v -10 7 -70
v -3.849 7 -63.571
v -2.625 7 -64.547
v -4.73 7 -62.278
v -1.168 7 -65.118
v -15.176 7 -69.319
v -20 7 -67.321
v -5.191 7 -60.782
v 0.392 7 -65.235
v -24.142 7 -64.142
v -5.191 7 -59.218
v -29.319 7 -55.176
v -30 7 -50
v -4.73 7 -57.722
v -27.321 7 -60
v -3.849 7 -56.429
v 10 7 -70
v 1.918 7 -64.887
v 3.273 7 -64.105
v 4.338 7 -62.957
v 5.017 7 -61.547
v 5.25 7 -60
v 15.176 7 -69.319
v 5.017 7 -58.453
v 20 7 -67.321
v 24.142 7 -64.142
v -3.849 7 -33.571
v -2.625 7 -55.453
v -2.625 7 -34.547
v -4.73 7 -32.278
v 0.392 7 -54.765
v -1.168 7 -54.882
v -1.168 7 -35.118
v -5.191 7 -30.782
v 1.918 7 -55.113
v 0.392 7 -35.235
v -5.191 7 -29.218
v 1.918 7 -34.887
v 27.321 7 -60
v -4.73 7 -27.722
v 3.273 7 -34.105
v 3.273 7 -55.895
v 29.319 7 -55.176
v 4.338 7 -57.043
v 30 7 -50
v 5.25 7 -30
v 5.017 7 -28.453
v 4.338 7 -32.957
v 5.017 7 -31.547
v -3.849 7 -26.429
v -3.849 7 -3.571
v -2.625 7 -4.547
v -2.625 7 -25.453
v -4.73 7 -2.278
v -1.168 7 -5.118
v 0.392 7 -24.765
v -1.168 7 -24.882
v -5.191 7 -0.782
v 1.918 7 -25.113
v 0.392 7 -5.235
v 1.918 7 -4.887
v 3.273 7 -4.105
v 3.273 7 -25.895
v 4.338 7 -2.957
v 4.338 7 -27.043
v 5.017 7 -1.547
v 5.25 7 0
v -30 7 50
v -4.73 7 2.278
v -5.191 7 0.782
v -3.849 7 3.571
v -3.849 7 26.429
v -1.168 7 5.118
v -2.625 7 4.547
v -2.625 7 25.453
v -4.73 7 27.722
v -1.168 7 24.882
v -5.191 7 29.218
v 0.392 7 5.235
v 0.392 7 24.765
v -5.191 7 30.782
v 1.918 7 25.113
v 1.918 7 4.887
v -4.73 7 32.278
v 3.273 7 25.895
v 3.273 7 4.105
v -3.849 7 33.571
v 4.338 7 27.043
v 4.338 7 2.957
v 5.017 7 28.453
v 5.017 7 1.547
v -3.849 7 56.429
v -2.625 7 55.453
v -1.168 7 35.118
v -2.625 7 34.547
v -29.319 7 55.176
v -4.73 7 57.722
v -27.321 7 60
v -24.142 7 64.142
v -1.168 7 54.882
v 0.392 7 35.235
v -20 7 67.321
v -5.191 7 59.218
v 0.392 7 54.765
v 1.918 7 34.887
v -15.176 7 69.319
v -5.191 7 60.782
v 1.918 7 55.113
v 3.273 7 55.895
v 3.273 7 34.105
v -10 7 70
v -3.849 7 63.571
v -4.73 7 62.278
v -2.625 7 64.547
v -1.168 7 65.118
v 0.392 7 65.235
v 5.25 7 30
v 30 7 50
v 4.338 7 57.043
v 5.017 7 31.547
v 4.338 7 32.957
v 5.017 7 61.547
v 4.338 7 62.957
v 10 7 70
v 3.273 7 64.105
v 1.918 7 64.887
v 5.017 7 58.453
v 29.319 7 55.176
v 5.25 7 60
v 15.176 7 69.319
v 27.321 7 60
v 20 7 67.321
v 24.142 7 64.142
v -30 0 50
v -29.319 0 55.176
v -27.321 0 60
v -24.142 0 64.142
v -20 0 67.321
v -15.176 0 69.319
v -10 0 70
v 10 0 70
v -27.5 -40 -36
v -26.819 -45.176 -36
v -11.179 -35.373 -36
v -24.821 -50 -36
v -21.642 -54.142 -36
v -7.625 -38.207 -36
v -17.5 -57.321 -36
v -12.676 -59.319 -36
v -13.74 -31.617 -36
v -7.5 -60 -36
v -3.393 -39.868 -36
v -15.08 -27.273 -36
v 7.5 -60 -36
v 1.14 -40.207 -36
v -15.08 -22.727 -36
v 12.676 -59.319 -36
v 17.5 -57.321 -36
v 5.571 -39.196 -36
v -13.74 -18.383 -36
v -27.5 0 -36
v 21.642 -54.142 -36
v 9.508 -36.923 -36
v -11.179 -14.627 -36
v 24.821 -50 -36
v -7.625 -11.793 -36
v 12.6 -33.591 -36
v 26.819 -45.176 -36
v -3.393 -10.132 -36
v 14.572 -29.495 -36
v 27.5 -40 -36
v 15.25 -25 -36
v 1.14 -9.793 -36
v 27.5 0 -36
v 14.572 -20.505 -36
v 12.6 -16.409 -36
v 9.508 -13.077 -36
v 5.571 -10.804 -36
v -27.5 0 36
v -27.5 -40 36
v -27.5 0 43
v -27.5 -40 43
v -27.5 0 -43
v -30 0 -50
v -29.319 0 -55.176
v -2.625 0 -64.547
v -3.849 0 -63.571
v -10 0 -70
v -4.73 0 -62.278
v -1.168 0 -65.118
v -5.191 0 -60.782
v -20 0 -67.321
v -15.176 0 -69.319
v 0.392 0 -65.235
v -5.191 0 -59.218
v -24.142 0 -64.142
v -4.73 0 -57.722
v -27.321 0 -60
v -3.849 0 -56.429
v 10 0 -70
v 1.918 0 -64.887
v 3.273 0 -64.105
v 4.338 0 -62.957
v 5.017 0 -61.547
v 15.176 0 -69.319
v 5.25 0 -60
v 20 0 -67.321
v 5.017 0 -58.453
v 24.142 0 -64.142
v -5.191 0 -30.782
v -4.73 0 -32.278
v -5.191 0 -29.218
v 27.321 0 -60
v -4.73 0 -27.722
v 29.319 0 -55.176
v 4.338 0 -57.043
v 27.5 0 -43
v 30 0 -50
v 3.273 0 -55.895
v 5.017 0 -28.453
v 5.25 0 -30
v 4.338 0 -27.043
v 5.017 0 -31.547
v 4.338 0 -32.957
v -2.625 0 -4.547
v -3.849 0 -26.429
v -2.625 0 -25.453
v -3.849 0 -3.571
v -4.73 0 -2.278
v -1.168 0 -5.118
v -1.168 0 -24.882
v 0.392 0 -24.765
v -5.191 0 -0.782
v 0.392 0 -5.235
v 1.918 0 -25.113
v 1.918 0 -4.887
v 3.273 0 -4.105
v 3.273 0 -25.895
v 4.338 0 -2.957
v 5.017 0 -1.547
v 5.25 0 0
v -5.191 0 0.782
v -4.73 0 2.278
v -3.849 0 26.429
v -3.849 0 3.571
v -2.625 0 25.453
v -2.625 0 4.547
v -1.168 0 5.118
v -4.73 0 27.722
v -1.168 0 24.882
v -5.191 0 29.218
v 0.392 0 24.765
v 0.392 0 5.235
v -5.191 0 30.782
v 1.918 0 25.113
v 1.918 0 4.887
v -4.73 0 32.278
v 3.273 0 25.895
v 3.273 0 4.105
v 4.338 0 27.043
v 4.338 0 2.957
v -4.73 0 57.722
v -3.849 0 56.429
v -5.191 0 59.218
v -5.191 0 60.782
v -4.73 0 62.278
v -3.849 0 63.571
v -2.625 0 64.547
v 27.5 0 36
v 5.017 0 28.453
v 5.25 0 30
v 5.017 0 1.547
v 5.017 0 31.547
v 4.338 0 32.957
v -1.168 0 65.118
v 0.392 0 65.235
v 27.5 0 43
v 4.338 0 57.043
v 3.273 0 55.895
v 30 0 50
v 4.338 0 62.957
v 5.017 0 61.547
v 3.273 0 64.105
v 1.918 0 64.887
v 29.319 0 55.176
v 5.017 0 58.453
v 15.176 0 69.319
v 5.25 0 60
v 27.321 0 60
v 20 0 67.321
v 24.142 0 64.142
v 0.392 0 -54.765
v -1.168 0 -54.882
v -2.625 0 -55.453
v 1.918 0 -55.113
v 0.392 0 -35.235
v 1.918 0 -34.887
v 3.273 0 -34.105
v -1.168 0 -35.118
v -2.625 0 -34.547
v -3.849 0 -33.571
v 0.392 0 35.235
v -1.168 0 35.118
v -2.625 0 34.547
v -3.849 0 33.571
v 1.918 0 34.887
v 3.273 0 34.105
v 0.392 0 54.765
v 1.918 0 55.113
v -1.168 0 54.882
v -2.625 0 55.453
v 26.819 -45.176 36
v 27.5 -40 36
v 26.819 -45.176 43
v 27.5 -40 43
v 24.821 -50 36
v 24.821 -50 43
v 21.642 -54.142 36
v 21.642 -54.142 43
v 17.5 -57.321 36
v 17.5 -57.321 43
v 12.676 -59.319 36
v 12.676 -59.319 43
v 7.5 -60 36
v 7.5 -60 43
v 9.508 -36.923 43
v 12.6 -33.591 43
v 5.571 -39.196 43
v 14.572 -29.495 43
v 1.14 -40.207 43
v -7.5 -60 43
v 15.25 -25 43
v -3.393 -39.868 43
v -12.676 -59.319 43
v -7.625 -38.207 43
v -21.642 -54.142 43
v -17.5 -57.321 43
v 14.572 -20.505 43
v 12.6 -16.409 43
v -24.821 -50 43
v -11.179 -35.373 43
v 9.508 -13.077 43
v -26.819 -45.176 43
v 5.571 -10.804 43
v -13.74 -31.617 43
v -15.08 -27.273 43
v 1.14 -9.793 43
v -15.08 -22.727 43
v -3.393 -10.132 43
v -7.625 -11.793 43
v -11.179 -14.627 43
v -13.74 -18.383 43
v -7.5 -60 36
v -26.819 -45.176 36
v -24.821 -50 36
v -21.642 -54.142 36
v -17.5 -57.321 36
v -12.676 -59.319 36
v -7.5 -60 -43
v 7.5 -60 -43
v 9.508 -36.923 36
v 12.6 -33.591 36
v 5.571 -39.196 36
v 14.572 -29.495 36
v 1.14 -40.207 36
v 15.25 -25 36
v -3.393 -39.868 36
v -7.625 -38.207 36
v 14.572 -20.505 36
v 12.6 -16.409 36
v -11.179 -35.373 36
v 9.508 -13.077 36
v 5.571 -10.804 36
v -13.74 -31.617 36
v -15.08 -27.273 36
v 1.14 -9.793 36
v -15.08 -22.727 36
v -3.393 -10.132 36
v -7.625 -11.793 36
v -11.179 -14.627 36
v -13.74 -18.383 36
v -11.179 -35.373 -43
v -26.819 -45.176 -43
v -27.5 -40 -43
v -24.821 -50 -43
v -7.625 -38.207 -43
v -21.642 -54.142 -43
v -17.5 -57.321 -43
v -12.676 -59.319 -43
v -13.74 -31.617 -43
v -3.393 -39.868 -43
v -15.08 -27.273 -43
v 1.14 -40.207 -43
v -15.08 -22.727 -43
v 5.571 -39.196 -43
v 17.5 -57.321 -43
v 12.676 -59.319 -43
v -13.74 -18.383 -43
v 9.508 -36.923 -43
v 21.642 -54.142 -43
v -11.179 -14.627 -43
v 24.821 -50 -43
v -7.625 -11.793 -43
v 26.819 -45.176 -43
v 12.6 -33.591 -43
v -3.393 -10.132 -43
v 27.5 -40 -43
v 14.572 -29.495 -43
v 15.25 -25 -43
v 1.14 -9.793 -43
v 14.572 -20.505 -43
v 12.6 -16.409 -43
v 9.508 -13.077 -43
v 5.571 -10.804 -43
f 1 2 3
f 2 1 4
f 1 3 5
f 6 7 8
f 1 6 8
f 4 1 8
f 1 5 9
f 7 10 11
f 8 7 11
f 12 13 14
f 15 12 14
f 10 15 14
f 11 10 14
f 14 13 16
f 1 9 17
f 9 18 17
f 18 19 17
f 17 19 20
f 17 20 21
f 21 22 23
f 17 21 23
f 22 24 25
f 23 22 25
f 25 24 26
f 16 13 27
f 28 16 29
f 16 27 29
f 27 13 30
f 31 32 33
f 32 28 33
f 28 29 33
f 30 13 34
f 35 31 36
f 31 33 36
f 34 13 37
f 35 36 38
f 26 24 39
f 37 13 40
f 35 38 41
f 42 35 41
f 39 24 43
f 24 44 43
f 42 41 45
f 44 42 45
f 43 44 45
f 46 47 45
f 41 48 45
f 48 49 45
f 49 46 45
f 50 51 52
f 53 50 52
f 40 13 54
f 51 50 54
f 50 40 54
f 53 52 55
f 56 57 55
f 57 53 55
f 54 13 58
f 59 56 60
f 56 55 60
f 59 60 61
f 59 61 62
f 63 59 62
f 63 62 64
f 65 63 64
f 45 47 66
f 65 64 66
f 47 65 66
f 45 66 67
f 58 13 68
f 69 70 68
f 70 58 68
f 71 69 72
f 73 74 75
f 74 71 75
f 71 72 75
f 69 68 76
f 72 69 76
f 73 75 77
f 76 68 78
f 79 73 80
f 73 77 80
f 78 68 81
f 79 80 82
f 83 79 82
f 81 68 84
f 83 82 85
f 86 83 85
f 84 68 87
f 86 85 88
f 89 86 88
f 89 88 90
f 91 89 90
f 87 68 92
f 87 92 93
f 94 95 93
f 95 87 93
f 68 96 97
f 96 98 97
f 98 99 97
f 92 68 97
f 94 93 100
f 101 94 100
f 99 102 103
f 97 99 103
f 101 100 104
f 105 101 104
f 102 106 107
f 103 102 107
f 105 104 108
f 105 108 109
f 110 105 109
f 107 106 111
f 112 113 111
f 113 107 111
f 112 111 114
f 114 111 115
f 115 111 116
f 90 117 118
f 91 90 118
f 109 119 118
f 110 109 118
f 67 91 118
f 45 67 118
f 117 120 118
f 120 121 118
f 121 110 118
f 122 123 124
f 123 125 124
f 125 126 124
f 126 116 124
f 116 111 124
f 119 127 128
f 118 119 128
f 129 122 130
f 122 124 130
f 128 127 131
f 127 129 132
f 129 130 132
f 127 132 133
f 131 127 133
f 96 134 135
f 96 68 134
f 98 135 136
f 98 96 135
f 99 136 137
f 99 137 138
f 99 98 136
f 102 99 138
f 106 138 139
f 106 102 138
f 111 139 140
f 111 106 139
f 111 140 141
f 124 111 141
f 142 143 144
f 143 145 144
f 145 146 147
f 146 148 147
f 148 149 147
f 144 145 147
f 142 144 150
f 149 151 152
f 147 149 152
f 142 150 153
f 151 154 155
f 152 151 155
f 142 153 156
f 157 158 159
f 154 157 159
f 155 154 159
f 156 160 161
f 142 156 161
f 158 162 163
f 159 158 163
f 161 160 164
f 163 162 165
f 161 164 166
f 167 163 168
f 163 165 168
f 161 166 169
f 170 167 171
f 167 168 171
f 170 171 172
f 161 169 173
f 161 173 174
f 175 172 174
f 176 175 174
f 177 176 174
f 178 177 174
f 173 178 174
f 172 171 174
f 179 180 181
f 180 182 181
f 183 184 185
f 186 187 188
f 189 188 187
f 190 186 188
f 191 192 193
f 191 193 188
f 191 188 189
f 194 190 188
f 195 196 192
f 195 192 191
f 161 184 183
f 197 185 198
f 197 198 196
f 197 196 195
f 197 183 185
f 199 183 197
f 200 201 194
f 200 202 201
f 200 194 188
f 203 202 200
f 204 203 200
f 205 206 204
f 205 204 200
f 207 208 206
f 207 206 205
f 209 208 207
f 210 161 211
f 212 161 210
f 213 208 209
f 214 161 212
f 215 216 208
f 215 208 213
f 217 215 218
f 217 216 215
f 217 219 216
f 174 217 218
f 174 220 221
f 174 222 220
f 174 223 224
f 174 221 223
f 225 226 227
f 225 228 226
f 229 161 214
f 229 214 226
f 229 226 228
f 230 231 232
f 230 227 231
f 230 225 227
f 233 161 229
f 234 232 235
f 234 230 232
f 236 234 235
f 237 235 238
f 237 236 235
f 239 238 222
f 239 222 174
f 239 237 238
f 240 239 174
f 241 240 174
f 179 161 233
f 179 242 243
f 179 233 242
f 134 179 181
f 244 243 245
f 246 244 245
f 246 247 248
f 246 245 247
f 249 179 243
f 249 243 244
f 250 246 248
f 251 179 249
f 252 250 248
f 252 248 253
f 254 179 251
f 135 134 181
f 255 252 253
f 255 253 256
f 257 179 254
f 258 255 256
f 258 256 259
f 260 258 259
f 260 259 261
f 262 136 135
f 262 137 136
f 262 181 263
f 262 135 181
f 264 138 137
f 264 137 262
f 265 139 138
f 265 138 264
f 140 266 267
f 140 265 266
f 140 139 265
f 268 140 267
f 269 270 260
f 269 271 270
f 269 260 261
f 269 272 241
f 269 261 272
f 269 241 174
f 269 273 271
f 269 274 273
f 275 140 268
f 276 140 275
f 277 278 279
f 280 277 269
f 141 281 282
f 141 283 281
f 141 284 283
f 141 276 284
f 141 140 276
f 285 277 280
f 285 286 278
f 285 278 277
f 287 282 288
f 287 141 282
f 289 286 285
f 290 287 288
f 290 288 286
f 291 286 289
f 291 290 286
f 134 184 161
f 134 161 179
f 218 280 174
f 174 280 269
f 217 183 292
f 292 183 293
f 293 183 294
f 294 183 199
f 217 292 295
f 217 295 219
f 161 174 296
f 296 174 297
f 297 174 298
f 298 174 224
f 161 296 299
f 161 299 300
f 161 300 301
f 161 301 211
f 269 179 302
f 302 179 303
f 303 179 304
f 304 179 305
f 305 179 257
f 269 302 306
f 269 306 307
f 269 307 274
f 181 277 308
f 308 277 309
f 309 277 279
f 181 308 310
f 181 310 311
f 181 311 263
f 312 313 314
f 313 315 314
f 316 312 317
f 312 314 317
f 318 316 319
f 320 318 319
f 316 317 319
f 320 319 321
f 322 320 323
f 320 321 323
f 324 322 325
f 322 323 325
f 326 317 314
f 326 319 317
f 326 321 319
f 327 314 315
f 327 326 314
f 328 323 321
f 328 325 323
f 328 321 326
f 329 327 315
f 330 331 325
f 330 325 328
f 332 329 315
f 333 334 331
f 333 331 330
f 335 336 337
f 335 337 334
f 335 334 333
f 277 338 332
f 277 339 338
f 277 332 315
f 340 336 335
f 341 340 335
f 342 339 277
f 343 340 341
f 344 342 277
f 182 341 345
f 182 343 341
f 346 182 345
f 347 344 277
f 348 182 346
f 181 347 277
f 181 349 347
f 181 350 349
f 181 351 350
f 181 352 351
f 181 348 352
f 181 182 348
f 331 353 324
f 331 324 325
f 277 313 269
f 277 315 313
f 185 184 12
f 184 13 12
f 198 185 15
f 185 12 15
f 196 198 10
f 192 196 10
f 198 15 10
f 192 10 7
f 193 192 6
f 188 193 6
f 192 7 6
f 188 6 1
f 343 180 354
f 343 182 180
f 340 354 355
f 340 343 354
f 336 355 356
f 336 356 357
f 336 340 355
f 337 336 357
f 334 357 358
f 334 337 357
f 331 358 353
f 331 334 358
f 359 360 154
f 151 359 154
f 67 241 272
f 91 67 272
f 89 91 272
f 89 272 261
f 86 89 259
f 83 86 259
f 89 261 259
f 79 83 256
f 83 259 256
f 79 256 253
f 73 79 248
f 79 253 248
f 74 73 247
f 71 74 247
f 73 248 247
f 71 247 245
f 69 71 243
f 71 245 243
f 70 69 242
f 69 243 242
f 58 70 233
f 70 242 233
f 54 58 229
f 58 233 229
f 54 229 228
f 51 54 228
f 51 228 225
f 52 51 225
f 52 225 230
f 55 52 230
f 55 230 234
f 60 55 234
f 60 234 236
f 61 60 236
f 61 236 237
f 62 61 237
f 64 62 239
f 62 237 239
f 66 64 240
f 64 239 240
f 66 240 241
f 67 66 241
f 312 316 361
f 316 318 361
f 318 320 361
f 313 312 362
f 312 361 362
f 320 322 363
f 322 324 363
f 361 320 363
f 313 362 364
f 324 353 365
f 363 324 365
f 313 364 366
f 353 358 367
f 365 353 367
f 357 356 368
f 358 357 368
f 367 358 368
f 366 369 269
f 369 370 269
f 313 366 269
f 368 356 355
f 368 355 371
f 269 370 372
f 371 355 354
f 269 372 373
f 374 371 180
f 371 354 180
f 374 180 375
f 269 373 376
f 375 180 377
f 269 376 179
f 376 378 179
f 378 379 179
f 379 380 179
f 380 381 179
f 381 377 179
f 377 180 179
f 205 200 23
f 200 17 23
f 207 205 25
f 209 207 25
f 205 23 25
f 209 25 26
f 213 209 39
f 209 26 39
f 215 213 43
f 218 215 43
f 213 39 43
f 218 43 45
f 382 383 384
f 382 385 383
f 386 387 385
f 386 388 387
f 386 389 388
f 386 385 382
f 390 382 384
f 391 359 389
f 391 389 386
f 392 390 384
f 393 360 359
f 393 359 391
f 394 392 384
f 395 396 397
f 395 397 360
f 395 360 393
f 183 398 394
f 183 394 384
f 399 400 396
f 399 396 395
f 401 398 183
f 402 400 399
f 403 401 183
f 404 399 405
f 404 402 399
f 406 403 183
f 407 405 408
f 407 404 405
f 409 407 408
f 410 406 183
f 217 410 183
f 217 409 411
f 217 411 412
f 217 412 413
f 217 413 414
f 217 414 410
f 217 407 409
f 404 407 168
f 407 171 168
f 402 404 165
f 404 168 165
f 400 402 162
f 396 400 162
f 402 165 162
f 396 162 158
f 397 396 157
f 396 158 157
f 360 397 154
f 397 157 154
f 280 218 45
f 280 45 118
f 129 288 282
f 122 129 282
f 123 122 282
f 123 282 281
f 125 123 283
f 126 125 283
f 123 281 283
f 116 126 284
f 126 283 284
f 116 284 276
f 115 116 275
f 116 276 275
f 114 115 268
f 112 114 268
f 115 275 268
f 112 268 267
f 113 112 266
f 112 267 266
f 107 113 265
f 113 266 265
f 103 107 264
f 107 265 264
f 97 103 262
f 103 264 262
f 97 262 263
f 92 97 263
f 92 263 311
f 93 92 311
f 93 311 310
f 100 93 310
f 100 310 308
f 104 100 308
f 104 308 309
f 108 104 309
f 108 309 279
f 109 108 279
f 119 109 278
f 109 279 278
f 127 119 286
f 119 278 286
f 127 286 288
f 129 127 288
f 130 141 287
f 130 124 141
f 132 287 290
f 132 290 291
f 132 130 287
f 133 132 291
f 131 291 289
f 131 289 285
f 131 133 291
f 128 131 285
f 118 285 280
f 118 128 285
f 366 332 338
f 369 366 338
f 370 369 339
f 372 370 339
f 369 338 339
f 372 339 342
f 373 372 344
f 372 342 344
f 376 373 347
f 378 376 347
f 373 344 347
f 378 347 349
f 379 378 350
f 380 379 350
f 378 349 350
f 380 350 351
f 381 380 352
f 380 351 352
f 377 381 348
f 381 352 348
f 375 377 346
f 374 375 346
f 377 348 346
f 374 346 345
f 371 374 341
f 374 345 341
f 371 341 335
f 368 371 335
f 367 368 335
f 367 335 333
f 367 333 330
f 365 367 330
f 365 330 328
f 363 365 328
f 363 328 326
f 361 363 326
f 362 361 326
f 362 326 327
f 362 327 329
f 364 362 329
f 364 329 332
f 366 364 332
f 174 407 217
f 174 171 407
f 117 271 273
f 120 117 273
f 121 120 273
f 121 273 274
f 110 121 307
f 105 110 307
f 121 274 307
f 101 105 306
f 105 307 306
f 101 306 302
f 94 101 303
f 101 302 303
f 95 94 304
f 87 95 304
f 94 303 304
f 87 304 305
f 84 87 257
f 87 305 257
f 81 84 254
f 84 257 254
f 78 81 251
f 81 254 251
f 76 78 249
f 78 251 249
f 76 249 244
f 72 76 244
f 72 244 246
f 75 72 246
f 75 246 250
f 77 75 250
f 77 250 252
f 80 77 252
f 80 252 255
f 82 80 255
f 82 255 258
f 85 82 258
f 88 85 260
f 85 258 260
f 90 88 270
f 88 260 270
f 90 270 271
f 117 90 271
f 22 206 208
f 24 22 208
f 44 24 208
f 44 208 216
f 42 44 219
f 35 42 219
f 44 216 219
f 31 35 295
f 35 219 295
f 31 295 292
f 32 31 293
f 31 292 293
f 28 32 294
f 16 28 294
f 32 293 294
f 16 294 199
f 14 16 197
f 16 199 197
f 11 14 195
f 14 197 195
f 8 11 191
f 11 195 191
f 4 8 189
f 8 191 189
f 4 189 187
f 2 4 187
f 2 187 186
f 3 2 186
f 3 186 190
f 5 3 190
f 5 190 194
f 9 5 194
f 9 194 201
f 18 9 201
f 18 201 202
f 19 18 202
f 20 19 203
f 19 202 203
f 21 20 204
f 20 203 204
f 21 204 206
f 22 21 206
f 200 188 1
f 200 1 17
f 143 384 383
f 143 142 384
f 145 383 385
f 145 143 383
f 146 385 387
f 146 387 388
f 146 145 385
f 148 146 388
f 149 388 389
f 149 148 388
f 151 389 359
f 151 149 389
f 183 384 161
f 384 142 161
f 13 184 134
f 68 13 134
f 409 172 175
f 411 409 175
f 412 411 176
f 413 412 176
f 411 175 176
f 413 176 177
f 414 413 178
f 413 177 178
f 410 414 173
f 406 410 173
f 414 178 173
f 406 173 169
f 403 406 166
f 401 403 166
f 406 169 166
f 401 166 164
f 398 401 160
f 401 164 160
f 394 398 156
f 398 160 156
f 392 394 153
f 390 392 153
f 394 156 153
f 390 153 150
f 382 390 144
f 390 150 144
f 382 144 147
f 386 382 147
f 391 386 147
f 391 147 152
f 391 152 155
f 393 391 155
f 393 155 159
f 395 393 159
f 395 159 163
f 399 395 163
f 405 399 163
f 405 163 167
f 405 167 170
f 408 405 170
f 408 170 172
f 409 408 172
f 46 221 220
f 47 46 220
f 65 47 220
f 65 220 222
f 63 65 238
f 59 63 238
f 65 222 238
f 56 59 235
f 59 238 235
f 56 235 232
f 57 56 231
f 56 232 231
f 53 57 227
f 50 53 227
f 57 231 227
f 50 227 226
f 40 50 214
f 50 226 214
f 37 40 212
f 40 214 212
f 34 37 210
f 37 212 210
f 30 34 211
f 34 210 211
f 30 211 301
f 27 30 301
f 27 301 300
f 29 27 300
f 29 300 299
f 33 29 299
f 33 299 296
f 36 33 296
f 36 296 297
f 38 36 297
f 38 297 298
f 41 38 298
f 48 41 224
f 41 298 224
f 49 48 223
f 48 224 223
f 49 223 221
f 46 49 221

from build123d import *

# Parameters (mm, degrees)
F0_W     = 60
F0_H     = 140
F0_R     = 5.25
F1_DEPTH = 7
F2_W     = 60
F2_H     = 7
F3_DEPTH = 27.5
F4_R     = 15.25
F5_DEPTH = 113.001
F6_R     = 20


with BuildPart() as f1:
    # F0 (on Front) → F1 (new body)
    with BuildSketch(Plane.XZ):
        Rectangle(F0_W, F0_H)
        with Locations((0, -60)):
            Circle(F0_R, mode=Mode.SUBTRACT)
        with Locations((0, -30)):
            Circle(F0_R, mode=Mode.SUBTRACT)
        Circle(F0_R, mode=Mode.SUBTRACT)
        with Locations((0, 30)):
            Circle(F0_R, mode=Mode.SUBTRACT)
        with Locations((0, 60)):
            Circle(F0_R, mode=Mode.SUBTRACT)
    extrude(amount=-F1_DEPTH)

    # F2 (on Right) → F3 (join, symmetric)
    with BuildSketch(Plane.YZ):
        with Locations((-30, 39.5)):
            Rectangle(F2_W, F2_H)
        with Locations((-30, -39.5)):
            Rectangle(F2_W, F2_H)
    extrude(amount=F3_DEPTH, both=True)

    # F4 (on face) → F5 (cut, through all)
    with BuildSketch(Plane.XY.offset(43)):
        with Locations((0, -25)):
            Circle(F4_R)
    extrude(amount=-F5_DEPTH, mode=Mode.SUBTRACT)

    # F6
    f6_edges = [f1.edges().sort_by_distance(p)[0] for p in [
        (-30, 3.5, 70),
        (30, 3.5, 70),
        (-27.5, -60, 39.5),
        (27.5, -60, 39.5),
        (-27.5, -60, -39.5),
        (27.5, -60, -39.5),
        (-30, 3.5, -70),
        (30, 3.5, -70),
    ]]
    fillet(f6_edges, radius=F6_R)


solid = f1.part
